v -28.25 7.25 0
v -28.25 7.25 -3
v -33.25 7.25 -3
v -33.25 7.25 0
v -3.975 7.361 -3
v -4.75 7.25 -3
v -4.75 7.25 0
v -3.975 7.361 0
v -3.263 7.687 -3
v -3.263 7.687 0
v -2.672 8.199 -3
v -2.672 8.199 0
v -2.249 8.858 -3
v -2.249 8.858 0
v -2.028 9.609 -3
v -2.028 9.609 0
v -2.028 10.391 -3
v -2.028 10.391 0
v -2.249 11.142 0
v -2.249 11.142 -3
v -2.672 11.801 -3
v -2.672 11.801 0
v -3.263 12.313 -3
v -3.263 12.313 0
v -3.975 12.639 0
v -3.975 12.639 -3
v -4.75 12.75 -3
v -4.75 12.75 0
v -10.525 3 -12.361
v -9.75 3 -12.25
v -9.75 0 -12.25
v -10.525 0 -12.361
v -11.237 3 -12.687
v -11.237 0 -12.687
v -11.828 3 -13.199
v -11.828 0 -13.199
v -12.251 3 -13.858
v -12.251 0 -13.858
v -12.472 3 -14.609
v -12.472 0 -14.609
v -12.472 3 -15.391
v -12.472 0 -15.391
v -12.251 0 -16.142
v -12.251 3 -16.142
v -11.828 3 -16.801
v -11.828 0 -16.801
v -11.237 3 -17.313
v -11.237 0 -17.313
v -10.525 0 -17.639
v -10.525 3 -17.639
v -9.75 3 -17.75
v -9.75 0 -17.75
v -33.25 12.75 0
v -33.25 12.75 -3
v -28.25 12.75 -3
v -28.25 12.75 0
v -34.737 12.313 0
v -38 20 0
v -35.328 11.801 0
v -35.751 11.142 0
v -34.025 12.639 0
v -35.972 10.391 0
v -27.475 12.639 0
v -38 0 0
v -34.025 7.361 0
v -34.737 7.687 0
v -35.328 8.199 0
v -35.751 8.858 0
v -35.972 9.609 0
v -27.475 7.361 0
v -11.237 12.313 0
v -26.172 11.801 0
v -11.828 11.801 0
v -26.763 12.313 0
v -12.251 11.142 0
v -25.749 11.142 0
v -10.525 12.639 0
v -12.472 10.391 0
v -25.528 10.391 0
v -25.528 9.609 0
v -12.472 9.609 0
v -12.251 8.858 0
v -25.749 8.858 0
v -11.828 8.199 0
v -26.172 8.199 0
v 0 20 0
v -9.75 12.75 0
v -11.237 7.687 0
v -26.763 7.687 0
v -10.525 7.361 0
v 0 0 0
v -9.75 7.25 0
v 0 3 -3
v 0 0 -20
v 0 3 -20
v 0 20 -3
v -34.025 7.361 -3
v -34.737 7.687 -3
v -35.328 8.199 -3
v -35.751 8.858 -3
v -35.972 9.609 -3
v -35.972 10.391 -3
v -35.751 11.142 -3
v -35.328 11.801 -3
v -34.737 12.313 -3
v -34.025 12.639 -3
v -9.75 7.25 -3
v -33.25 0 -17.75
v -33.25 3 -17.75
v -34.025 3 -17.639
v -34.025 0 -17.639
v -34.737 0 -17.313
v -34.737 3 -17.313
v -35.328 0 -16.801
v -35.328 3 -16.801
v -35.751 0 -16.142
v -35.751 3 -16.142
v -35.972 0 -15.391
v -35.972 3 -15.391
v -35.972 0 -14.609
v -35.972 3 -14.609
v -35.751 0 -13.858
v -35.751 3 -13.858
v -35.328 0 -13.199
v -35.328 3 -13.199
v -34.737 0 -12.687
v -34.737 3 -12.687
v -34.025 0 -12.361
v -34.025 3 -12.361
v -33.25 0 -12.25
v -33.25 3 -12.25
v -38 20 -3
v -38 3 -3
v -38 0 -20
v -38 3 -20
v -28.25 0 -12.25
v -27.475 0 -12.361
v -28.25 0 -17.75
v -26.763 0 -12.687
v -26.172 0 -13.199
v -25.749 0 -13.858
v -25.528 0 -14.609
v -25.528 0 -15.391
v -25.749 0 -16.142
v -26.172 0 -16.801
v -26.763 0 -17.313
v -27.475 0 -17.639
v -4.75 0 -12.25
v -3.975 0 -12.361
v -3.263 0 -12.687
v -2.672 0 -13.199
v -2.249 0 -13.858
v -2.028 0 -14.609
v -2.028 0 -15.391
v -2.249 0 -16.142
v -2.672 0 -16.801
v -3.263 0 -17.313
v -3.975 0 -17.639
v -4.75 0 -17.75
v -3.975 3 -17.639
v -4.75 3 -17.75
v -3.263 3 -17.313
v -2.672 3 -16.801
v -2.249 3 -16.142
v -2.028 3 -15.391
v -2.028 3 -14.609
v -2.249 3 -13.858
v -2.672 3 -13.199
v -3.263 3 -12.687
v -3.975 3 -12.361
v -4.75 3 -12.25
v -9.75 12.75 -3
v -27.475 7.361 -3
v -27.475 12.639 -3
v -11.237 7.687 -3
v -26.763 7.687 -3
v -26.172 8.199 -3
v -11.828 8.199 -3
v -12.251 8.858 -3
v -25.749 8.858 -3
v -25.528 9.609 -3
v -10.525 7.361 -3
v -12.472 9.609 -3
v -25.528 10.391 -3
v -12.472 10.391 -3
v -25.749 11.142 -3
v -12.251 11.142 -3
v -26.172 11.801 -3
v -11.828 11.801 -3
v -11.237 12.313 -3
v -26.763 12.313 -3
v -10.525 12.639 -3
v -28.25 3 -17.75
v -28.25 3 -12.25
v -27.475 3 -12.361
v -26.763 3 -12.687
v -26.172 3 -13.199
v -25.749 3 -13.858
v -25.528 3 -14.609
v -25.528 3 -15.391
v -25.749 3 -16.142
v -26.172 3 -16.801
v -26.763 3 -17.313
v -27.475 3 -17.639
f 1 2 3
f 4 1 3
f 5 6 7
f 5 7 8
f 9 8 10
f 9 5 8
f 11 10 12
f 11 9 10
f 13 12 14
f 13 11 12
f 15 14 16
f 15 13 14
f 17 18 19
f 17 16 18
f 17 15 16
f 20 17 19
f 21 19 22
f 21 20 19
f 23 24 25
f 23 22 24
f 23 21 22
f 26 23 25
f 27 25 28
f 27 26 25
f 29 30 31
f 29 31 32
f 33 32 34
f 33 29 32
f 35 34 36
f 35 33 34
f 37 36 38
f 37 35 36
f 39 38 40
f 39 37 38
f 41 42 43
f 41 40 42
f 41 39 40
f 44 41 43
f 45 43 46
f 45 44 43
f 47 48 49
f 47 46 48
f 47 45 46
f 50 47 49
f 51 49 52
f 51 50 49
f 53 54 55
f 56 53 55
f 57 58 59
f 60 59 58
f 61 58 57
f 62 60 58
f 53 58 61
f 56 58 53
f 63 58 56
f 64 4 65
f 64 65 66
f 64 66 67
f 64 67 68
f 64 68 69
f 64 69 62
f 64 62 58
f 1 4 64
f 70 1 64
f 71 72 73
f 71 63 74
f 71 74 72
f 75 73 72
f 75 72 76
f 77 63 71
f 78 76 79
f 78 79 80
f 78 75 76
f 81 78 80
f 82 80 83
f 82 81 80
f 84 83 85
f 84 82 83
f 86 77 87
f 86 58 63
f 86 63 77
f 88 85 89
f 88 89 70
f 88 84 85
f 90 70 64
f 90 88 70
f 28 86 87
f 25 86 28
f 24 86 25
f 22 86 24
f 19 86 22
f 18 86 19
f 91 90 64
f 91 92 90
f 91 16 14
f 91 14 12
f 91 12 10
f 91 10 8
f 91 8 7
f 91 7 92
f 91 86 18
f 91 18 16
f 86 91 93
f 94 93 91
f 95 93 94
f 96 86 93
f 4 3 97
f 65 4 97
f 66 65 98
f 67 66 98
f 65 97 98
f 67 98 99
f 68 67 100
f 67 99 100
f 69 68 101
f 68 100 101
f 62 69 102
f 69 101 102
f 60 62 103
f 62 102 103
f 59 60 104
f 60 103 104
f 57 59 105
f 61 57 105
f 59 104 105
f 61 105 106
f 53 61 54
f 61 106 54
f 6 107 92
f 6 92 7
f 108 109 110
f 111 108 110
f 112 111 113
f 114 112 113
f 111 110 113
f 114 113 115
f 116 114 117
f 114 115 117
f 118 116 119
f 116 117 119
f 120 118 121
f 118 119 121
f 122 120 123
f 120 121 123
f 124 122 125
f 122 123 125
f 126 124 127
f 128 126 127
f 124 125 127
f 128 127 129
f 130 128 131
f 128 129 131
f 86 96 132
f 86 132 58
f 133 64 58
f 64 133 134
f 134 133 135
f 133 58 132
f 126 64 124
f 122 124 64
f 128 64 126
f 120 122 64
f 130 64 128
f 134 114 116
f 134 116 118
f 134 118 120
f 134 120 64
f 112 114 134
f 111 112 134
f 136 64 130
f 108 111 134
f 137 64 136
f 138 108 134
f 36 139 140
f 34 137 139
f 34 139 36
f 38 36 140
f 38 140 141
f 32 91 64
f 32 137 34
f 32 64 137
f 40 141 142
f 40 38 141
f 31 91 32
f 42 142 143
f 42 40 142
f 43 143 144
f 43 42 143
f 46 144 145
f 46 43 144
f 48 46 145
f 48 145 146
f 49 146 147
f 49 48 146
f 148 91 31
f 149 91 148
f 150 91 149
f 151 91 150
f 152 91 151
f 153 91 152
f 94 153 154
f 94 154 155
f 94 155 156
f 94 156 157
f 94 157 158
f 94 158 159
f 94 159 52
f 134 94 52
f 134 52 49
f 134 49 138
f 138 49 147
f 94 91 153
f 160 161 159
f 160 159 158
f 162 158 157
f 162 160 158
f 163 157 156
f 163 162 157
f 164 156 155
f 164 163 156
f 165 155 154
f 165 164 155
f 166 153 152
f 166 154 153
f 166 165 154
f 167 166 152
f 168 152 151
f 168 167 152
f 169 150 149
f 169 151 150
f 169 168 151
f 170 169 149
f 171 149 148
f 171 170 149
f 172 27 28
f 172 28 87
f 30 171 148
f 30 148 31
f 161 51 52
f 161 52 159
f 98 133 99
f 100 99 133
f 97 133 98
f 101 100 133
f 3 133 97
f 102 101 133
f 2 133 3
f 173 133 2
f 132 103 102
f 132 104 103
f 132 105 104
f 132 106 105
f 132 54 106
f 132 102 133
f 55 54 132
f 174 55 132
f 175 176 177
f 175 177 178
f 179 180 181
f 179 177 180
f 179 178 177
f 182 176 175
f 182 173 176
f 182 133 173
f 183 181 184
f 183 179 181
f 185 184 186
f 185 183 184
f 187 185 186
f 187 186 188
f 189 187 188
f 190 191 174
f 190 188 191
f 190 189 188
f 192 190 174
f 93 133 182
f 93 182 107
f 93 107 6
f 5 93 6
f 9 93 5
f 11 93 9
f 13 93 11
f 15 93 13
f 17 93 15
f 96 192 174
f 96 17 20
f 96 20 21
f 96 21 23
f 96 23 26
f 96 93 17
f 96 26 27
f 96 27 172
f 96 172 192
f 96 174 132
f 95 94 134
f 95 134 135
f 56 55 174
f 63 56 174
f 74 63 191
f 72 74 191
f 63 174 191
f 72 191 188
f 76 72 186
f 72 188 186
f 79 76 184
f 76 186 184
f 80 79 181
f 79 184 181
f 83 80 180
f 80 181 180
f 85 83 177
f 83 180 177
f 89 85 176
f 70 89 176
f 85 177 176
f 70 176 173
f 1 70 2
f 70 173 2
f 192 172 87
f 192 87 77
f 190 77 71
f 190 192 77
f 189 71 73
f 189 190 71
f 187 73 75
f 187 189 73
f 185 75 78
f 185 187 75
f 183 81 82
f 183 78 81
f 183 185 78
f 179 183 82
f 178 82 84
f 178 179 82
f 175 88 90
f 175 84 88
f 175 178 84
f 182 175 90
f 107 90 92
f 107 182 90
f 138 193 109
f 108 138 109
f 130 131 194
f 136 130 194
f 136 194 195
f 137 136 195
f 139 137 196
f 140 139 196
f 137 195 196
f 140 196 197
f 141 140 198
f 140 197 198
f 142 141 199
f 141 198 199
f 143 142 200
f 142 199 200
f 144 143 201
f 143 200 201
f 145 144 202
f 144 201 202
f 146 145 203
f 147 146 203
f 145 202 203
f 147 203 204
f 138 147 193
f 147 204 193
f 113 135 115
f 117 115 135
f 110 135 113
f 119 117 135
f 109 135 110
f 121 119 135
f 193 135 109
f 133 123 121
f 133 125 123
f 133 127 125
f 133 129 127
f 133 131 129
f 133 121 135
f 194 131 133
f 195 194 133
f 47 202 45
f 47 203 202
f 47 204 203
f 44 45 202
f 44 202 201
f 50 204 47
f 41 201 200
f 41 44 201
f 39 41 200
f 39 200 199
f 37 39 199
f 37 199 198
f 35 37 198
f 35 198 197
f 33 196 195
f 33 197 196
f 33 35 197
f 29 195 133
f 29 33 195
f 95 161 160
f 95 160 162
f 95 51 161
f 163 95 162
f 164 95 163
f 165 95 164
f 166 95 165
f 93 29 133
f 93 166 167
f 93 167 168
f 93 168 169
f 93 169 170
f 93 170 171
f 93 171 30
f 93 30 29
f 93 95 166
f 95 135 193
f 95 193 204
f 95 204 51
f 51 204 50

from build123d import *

# Parameters (mm, degrees)
BOSS_EXTRUDE1_DEPTH = 38
CUT_EXTRUDE1_DEPTH  = 4
CUT_EXTRUDE2_DEPTH  = 4


with BuildPart() as part:
    # Sketch1 → Boss-Extrude1 (new body)
    with BuildSketch(Plane(origin=(0, 0, 0), x_dir=(0, 0, -1), z_dir=(1, 0, 0))):
        Polygon((0, 20), (0, 0), (20, 0), (20, 3), (3, 3), (3, 20), align=None)
    extrude(amount=-BOSS_EXTRUDE1_DEPTH)

    # Sketch2 → Cut-Extrude1 (cut, through all)
    with BuildSketch(Plane(origin=(0, 0, -3), x_dir=(-1, 0, 0), z_dir=(0, 0, -1))):
        with BuildLine():
            Line((4.75, 12.75), (9.75, 12.75))
            ThreePointArc((9.75, 12.75), (12.5, 10), (9.75, 7.25))
            Line((9.75, 7.25), (4.75, 7.25))
            ThreePointArc((4.75, 7.25), (2, 10), (4.75, 12.75))
        make_face()
    cut_extrude1 = extrude(amount=-CUT_EXTRUDE1_DEPTH, mode=Mode.SUBTRACT)

    # Sketch3 → Cut-Extrude2 (cut, through all)
    with BuildSketch(Plane(origin=(0, 3, 0), x_dir=(1, 0, 0), z_dir=(0, 1, 0))):
        with BuildLine():
            Line((-4.75, 12.25), (-9.75, 12.25))
            ThreePointArc((-9.75, 12.25), (-12.5, 15), (-9.75, 17.75))
            Line((-9.75, 17.75), (-4.75, 17.75))
            ThreePointArc((-4.75, 17.75), (-2, 15), (-4.75, 12.25))
        make_face()
    cut_extrude2 = extrude(amount=-CUT_EXTRUDE2_DEPTH, mode=Mode.SUBTRACT)

    # Mirror1: Cut-Extrude1 across plane
    add(cut_extrude1.mirror(Plane(origin=(-19, 0, 0), x_dir=(0, 0, 1), z_dir=(1, 0, 0))), mode=Mode.SUBTRACT)

    # Mirror2: Cut-Extrude2 across plane
    add(cut_extrude2.mirror(Plane(origin=(-19, 0, 0), x_dir=(0, 0, 1), z_dir=(1, 0, 0))), mode=Mode.SUBTRACT)


solid = part.part
